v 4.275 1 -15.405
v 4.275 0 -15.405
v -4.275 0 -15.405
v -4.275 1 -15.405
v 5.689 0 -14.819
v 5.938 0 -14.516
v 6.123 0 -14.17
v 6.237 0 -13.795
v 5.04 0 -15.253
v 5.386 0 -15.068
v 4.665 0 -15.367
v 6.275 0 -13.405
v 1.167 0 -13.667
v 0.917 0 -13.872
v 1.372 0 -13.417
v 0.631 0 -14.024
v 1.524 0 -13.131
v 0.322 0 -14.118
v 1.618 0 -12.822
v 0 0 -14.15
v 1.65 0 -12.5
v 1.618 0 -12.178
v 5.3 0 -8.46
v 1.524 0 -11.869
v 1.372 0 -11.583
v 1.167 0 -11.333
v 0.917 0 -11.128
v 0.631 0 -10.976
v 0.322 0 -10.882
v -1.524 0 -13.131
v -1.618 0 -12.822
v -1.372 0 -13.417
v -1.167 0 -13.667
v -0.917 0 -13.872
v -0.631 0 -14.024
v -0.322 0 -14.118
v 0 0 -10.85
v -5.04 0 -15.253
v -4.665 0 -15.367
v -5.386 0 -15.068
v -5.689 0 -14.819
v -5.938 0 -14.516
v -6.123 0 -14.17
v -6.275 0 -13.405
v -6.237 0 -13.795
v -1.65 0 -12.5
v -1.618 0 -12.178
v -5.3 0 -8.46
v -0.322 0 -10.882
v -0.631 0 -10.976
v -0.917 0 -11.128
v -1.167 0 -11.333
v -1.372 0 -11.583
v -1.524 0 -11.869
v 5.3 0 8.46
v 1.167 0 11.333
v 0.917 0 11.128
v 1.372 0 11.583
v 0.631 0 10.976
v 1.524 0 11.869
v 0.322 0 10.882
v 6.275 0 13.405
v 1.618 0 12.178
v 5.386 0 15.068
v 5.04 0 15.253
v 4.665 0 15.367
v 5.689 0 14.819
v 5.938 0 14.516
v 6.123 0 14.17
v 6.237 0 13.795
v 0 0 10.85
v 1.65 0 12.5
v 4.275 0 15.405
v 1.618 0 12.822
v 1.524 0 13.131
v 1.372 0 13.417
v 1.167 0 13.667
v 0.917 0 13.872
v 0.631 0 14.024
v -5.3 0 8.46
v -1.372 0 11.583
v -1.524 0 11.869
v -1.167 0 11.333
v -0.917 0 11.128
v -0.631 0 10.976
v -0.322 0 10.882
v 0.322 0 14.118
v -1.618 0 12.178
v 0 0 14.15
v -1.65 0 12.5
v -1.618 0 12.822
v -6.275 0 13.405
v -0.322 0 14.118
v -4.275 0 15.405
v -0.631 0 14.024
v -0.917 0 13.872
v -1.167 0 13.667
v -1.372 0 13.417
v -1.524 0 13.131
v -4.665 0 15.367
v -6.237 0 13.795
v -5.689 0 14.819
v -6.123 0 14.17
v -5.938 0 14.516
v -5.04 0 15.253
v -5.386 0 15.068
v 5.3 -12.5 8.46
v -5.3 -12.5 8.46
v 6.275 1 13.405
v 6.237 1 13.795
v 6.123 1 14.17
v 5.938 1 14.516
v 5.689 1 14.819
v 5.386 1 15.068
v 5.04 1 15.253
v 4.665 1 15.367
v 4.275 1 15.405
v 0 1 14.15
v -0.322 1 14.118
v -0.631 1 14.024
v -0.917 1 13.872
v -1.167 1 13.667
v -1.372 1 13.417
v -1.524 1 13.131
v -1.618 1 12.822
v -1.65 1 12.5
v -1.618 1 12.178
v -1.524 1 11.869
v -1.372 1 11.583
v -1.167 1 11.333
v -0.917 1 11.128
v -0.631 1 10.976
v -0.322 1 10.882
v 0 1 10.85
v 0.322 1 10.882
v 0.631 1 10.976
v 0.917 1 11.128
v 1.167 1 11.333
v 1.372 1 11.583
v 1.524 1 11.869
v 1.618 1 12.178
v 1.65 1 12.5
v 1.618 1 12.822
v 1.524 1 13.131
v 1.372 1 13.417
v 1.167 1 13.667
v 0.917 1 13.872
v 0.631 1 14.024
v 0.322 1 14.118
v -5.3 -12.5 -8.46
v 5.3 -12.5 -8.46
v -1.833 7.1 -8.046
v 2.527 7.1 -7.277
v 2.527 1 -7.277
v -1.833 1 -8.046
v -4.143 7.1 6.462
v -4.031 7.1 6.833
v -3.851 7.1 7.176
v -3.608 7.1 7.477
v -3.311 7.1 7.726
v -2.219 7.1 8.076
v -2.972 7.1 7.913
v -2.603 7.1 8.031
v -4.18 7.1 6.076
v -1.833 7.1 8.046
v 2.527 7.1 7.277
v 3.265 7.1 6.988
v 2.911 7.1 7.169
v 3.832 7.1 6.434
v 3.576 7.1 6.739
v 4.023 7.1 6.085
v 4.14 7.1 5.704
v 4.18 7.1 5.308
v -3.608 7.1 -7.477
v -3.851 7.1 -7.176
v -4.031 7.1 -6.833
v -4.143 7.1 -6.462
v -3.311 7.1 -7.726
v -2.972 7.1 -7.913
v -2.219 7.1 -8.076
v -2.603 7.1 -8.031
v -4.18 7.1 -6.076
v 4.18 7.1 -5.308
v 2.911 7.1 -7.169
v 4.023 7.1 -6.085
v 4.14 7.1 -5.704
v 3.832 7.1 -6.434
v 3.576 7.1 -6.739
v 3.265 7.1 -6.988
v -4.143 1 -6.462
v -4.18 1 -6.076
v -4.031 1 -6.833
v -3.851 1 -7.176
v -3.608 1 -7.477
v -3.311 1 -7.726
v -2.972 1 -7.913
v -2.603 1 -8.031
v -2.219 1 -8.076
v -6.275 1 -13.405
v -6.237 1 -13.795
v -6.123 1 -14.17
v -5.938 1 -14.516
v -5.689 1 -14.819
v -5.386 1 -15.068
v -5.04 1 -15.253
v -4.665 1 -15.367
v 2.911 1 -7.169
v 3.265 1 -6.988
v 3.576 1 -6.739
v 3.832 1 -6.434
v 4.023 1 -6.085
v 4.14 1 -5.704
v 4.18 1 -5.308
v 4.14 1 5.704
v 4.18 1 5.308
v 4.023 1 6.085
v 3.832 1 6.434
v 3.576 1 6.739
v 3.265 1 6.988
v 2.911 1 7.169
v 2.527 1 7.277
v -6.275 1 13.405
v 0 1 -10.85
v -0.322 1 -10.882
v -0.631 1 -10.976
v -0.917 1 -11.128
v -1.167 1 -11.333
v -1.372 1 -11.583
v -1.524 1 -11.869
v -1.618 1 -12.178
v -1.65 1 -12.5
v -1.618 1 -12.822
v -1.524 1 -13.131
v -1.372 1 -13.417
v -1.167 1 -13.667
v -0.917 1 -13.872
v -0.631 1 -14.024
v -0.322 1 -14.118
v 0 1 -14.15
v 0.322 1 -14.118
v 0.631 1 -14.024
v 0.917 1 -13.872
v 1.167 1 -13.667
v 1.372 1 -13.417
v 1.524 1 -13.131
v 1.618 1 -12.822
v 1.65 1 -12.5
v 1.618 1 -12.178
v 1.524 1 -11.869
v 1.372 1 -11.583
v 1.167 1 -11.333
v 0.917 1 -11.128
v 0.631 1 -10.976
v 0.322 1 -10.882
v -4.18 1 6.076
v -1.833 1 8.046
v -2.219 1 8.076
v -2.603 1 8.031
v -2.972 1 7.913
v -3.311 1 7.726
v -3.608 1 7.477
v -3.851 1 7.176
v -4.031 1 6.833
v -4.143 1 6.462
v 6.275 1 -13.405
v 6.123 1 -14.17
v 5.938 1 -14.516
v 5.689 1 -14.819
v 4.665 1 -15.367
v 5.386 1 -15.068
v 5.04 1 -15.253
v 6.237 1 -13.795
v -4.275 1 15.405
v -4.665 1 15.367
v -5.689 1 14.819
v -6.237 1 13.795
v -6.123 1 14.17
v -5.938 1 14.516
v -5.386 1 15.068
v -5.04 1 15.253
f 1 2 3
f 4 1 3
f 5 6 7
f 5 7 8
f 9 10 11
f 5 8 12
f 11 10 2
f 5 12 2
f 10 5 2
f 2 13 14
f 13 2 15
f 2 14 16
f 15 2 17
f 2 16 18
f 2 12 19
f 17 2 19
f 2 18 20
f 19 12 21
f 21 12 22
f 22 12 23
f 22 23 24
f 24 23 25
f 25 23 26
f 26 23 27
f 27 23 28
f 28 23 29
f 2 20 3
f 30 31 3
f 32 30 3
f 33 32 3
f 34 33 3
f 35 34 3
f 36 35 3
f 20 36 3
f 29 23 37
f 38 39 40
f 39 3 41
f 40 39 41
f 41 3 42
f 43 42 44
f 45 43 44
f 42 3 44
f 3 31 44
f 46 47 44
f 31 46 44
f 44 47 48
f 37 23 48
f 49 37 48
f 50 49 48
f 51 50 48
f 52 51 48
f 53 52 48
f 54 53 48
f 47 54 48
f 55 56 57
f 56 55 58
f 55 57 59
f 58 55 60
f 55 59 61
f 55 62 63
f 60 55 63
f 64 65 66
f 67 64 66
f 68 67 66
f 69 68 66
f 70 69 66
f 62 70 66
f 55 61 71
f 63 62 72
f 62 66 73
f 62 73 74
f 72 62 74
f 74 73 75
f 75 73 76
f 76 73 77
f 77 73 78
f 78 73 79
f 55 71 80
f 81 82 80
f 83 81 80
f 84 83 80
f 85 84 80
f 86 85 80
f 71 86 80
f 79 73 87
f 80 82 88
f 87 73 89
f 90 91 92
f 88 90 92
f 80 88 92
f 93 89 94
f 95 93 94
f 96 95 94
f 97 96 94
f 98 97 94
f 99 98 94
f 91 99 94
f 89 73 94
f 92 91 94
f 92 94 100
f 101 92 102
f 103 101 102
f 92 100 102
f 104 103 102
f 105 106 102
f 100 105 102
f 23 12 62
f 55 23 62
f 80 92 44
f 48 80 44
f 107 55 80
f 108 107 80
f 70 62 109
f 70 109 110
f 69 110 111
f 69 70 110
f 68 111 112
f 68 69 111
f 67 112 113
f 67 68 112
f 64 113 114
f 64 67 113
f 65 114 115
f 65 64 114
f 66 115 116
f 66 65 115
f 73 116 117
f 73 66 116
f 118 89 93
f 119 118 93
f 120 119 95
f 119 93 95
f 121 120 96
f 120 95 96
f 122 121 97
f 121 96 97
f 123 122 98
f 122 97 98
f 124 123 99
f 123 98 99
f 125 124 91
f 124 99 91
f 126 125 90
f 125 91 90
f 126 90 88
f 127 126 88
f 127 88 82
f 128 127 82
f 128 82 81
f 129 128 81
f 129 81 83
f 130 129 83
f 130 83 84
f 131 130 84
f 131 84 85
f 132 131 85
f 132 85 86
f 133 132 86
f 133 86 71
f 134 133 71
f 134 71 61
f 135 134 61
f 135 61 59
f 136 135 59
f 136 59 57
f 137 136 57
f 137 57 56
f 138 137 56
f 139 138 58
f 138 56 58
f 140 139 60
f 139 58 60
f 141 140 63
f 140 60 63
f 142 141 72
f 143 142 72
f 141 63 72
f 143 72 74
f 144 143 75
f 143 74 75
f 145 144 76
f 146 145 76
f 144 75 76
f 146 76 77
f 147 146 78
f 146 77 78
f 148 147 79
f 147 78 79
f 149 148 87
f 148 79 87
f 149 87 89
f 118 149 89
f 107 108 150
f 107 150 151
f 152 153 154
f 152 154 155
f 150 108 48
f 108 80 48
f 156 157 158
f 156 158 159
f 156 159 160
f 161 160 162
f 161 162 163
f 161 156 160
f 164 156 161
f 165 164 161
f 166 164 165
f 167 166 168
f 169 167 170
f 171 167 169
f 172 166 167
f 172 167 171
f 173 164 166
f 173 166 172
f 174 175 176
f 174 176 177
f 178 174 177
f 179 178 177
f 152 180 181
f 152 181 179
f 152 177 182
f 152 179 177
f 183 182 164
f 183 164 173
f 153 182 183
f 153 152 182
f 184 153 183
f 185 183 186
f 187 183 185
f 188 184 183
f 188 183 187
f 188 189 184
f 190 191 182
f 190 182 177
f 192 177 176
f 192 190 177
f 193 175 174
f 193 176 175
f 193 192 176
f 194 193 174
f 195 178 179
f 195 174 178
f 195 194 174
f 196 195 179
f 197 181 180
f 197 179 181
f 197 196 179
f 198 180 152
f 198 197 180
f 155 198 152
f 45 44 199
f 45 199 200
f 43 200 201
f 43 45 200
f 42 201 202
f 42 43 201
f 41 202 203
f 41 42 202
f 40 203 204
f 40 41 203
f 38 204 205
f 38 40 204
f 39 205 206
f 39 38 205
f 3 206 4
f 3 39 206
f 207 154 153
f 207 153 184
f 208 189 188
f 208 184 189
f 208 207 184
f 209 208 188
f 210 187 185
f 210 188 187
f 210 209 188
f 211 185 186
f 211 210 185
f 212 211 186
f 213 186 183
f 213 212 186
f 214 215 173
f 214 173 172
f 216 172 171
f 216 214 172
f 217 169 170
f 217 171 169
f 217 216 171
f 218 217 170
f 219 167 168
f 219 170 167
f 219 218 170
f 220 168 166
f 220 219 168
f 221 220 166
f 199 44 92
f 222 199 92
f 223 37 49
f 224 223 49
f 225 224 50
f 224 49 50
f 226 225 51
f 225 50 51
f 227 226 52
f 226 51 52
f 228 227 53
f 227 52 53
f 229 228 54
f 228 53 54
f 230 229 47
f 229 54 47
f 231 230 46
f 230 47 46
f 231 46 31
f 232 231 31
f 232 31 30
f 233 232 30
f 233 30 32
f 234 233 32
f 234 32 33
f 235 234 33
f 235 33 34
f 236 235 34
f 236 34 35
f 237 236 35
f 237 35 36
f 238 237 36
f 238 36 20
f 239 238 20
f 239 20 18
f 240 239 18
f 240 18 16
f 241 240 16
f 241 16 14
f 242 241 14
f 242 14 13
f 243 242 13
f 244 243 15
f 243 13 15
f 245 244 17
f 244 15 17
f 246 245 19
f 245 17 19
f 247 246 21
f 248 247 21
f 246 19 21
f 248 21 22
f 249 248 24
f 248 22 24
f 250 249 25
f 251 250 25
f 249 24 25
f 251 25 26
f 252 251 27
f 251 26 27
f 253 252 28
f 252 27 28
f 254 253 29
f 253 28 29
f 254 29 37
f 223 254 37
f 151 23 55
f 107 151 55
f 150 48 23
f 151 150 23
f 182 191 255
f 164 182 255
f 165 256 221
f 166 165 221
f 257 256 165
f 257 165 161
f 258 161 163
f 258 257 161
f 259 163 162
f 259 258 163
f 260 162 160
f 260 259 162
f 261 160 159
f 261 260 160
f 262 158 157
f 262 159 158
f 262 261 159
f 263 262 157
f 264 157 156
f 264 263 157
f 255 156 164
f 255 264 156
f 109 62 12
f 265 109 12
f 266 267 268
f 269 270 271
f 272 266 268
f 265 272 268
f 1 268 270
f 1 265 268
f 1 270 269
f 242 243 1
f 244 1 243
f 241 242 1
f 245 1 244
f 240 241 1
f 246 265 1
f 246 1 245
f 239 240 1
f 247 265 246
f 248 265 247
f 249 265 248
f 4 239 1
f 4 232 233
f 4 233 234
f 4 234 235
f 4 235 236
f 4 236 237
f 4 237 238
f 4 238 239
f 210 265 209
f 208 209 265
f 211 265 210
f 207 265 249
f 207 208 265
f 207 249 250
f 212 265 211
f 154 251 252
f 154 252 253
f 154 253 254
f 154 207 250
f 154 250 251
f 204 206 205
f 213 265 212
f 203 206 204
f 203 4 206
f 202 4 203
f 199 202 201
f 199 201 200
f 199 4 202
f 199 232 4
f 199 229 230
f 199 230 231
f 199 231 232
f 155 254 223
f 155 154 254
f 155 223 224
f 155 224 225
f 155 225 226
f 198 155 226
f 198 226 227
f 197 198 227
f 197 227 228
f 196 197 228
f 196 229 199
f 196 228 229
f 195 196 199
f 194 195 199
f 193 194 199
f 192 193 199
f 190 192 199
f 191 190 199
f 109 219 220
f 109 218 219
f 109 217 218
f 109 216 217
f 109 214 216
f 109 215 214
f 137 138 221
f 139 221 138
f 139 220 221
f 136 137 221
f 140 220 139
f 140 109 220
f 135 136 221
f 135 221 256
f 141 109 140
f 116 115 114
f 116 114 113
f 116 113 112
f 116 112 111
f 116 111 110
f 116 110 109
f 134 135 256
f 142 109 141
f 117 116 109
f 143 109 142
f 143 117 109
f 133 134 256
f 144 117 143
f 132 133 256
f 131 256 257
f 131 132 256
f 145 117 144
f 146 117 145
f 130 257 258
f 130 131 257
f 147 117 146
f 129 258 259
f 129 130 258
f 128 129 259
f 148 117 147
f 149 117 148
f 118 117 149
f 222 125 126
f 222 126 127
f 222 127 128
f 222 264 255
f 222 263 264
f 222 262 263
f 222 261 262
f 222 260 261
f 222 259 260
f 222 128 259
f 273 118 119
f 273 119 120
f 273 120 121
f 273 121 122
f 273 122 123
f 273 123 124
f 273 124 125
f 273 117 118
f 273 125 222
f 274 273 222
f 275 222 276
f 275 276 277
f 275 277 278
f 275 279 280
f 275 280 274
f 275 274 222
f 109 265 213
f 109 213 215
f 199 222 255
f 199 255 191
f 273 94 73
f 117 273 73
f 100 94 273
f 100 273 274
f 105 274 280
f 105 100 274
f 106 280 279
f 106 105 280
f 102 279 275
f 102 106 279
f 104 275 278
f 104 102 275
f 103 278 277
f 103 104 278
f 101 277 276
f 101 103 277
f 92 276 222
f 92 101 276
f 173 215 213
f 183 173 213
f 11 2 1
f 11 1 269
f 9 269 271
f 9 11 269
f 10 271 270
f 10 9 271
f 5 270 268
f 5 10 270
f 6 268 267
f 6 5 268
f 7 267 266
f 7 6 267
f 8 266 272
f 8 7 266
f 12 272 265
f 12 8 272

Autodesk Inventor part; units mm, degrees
ref_plane "YZ Plane" through (0, 0, 0) normal (1, 0, 0) x (0, 1, 0)
ref_plane "XZ Plane" through (0, 0, 0) normal (0, 1, 0) x (-1, 0, 0)
ref_plane "XY Plane" through (0, 0, 0) normal (0, 0, 1) x (1, 0, 0)
sketch "Skizze9" plane through (0, 0, 0) normal (0, 1, 0) x (-1, 0, 0)
  line L0 (4.275, 15.405) -> (-4.275, 15.405)
  line L1 (-6.275, 13.405) -> (-6.275, -13.405)
  line L2 (-4.275, -15.405) -> (4.275, -15.405)
  line L3 (6.275, -13.405) -> (6.275, 13.405)
  line L4 (0, 0) -> (0, -15.405) construction
  line L5 (0, 0) -> (6.275, 0) construction
  arc A0 (6.275, 13.405) -> (4.275, 15.405) centre (4.275, 13.405) ccw
  arc A1 (-6.275, -13.405) -> (-4.275, -15.405) centre (-4.275, -13.405) ccw
  arc A2 (4.275, -15.405) -> (6.275, -13.405) centre (4.275, -13.405) ccw
  arc A3 (-4.275, 15.405) -> (-6.275, 13.405) centre (-4.275, 13.405) ccw
  point P0 (6.275, 15.405)
  point P1 (-6.275, -15.405)
  point P2 (-6.275, 15.405)
  point P3 (6.275, -15.405)
  dimension "d41" = 30.81
  dimension "d42" = 12.55
  dimension "d61" = 2
extrude "Extrusion6" add sketch "Skizze9" along normal blind 1
sketch "Skizze10" plane through (0, 1, 0) normal (0, 1, 0) x (1, 0, 0)
  line L0 (-4.275, -15.405) -> (4.275, -15.405) projected
  line L1 (6.275, -13.405) -> (6.275, 13.405) projected
  line L2 (4.275, 15.405) -> (-4.275, 15.405) projected
  line L3 (-6.275, 13.405) -> (-6.275, -13.405) projected
  line L4 (4.18, -5.3077) -> (4.18, 5.3077)
  line L5 (2.5273, 7.2773) -> (-1.8327, 8.0461)
  line L6 (-4.18, 6.0765) -> (-4.18, -6.0765)
  line L7 (-1.8327, -8.0461) -> (2.5273, -7.2773)
  line L8 (0, 0) -> (-4.18, 0) construction
  line L9 (0, 0) -> (4.18, 0) construction
  line L10 (-4.18, -8.46) -> (6.275, -8.46) construction
  line L11 (-4.18, 8.46) -> (6.275, 8.46) construction
  arc A0 (-4.18, -6.0765) -> (-1.8327, -8.0461) centre (-2.18, -6.0765) ccw
  arc A1 (-1.8327, 8.0461) -> (-4.18, 6.0765) centre (-2.18, 6.0765) ccw
  arc A2 (2.5273, -7.2773) -> (4.18, -5.3077) centre (2.18, -5.3077) ccw
  arc A3 (4.18, 5.3077) -> (2.5273, 7.2773) centre (2.18, 5.3077) ccw
  arc A4 (4.275, -15.405) -> (6.275, -13.405) centre (4.275, -13.405) ccw projected
  arc A5 (6.275, 13.405) -> (4.275, 15.405) centre (4.275, 13.405) ccw projected
  arc A6 (-4.275, 15.405) -> (-6.275, 13.405) centre (-4.275, 13.405) ccw projected
  arc A7 (-6.275, -13.405) -> (-4.275, -15.405) centre (-4.275, -13.405) ccw projected
  dimension "d45" = 10
  dimension "d46" = 4.18
  dimension "d47" = 4.18
  dimension "d48" = 16.92
  dimension "d49" = 2
extrude "Extrusion7" add sketch "Skizze10" along normal blind 6.1 contours A2 L7 A0 L6 A1 L5 A3 L4
sketch "Skizze11" plane through (0, 1, 0) normal (0, 1, 0) x (1, 0, 0)
  arc A0 (-1.8327, 8.0461) -> (-4.18, 6.0765) centre (-2.18, 6.0765) ccw projected
  line L0 (-1.8327, 8.0461) -> (2.5273, 7.2773) projected
  arc A1 (4.18, 5.3077) -> (2.5273, 7.2773) centre (2.18, 5.3077) ccw projected
  line L1 (4.18, 5.3077) -> (4.18, -5.3077) projected
  arc A2 (2.5273, -7.2773) -> (4.18, -5.3077) centre (2.18, -5.3077) ccw projected
  line L2 (2.5273, -7.2773) -> (-1.8327, -8.0461) projected
  arc A3 (-4.18, -6.0765) -> (-1.8327, -8.0461) centre (-2.18, -6.0765) ccw projected
  line L3 (-4.18, -6.0765) -> (-4.18, 6.0765) projected
  line L4 (-4.275, -15.405) -> (4.275, -15.405) projected
  line L5 (6.275, -13.405) -> (6.275, 13.405) projected
  line L6 (4.275, 15.405) -> (-4.275, 15.405) projected
  line L7 (-6.275, 13.405) -> (-6.275, -13.405) projected
  line L8 (0, 0) -> (0, 12.5) construction
  line L9 (0, 0) -> (0, -12.5) construction
  arc A4 (4.275, -15.405) -> (6.275, -13.405) centre (4.275, -13.405) ccw projected
  arc A5 (6.275, 13.405) -> (4.275, 15.405) centre (4.275, 13.405) ccw projected
  arc A6 (-4.275, 15.405) -> (-6.275, 13.405) centre (-4.275, 13.405) ccw projected
  arc A7 (-6.275, -13.405) -> (-4.275, -15.405) centre (-4.275, -13.405) ccw projected
  dimension "d52" = 12.5
  dimension "d53" = 12.5
hole "Bohrung3" at (0, 1, 12.5) at (0, 1, -12.5) direction (0, -1, 0) diameter 3.3 end through all
sketch "Skizze12" plane through (0, 0, 0) normal (0, -1, 0) x (1, 0, 0)
  circle A0 centre (0, 12.5) radius 1.65 projected
  circle A1 centre (0, -12.5) radius 1.65 projected
  line L0 (-4.275, 15.405) -> (4.275, 15.405) projected
  arc A2 (-4.275, 15.405) -> (-6.275, 13.405) centre (-4.275, 13.405) ccw projected
  line L1 (-6.275, -13.405) -> (-6.275, 13.405) projected
  arc A3 (-6.275, -13.405) -> (-4.275, -15.405) centre (-4.275, -13.405) ccw projected
  line L2 (4.275, -15.405) -> (-4.275, -15.405) projected
  arc A4 (4.275, -15.405) -> (6.275, -13.405) centre (4.275, -13.405) ccw projected
  line L3 (6.275, 13.405) -> (6.275, -13.405) projected
  arc A5 (6.275, 13.405) -> (4.275, 15.405) centre (4.275, 13.405) ccw projected
  line L4 (-5.3, -8.46) -> (5.3, -8.46)
  line L5 (5.3, -8.46) -> (5.3, 8.46)
  line L6 (5.3, 8.46) -> (-5.3, 8.46)
  line L7 (-5.3, 8.46) -> (-5.3, -8.46)
  line L8 (0, 0) -> (0, 8.46) construction
  line L9 (0, 0) -> (-5.3, 0) construction
  dimension "d62" = 10.6
  dimension "d63" = 16.92
extrude "Extrusion8" add sketch "Skizze12" along normal blind 12.5 contours L7 L6 L5 L4
properties part number "anschluss_daten_2"
